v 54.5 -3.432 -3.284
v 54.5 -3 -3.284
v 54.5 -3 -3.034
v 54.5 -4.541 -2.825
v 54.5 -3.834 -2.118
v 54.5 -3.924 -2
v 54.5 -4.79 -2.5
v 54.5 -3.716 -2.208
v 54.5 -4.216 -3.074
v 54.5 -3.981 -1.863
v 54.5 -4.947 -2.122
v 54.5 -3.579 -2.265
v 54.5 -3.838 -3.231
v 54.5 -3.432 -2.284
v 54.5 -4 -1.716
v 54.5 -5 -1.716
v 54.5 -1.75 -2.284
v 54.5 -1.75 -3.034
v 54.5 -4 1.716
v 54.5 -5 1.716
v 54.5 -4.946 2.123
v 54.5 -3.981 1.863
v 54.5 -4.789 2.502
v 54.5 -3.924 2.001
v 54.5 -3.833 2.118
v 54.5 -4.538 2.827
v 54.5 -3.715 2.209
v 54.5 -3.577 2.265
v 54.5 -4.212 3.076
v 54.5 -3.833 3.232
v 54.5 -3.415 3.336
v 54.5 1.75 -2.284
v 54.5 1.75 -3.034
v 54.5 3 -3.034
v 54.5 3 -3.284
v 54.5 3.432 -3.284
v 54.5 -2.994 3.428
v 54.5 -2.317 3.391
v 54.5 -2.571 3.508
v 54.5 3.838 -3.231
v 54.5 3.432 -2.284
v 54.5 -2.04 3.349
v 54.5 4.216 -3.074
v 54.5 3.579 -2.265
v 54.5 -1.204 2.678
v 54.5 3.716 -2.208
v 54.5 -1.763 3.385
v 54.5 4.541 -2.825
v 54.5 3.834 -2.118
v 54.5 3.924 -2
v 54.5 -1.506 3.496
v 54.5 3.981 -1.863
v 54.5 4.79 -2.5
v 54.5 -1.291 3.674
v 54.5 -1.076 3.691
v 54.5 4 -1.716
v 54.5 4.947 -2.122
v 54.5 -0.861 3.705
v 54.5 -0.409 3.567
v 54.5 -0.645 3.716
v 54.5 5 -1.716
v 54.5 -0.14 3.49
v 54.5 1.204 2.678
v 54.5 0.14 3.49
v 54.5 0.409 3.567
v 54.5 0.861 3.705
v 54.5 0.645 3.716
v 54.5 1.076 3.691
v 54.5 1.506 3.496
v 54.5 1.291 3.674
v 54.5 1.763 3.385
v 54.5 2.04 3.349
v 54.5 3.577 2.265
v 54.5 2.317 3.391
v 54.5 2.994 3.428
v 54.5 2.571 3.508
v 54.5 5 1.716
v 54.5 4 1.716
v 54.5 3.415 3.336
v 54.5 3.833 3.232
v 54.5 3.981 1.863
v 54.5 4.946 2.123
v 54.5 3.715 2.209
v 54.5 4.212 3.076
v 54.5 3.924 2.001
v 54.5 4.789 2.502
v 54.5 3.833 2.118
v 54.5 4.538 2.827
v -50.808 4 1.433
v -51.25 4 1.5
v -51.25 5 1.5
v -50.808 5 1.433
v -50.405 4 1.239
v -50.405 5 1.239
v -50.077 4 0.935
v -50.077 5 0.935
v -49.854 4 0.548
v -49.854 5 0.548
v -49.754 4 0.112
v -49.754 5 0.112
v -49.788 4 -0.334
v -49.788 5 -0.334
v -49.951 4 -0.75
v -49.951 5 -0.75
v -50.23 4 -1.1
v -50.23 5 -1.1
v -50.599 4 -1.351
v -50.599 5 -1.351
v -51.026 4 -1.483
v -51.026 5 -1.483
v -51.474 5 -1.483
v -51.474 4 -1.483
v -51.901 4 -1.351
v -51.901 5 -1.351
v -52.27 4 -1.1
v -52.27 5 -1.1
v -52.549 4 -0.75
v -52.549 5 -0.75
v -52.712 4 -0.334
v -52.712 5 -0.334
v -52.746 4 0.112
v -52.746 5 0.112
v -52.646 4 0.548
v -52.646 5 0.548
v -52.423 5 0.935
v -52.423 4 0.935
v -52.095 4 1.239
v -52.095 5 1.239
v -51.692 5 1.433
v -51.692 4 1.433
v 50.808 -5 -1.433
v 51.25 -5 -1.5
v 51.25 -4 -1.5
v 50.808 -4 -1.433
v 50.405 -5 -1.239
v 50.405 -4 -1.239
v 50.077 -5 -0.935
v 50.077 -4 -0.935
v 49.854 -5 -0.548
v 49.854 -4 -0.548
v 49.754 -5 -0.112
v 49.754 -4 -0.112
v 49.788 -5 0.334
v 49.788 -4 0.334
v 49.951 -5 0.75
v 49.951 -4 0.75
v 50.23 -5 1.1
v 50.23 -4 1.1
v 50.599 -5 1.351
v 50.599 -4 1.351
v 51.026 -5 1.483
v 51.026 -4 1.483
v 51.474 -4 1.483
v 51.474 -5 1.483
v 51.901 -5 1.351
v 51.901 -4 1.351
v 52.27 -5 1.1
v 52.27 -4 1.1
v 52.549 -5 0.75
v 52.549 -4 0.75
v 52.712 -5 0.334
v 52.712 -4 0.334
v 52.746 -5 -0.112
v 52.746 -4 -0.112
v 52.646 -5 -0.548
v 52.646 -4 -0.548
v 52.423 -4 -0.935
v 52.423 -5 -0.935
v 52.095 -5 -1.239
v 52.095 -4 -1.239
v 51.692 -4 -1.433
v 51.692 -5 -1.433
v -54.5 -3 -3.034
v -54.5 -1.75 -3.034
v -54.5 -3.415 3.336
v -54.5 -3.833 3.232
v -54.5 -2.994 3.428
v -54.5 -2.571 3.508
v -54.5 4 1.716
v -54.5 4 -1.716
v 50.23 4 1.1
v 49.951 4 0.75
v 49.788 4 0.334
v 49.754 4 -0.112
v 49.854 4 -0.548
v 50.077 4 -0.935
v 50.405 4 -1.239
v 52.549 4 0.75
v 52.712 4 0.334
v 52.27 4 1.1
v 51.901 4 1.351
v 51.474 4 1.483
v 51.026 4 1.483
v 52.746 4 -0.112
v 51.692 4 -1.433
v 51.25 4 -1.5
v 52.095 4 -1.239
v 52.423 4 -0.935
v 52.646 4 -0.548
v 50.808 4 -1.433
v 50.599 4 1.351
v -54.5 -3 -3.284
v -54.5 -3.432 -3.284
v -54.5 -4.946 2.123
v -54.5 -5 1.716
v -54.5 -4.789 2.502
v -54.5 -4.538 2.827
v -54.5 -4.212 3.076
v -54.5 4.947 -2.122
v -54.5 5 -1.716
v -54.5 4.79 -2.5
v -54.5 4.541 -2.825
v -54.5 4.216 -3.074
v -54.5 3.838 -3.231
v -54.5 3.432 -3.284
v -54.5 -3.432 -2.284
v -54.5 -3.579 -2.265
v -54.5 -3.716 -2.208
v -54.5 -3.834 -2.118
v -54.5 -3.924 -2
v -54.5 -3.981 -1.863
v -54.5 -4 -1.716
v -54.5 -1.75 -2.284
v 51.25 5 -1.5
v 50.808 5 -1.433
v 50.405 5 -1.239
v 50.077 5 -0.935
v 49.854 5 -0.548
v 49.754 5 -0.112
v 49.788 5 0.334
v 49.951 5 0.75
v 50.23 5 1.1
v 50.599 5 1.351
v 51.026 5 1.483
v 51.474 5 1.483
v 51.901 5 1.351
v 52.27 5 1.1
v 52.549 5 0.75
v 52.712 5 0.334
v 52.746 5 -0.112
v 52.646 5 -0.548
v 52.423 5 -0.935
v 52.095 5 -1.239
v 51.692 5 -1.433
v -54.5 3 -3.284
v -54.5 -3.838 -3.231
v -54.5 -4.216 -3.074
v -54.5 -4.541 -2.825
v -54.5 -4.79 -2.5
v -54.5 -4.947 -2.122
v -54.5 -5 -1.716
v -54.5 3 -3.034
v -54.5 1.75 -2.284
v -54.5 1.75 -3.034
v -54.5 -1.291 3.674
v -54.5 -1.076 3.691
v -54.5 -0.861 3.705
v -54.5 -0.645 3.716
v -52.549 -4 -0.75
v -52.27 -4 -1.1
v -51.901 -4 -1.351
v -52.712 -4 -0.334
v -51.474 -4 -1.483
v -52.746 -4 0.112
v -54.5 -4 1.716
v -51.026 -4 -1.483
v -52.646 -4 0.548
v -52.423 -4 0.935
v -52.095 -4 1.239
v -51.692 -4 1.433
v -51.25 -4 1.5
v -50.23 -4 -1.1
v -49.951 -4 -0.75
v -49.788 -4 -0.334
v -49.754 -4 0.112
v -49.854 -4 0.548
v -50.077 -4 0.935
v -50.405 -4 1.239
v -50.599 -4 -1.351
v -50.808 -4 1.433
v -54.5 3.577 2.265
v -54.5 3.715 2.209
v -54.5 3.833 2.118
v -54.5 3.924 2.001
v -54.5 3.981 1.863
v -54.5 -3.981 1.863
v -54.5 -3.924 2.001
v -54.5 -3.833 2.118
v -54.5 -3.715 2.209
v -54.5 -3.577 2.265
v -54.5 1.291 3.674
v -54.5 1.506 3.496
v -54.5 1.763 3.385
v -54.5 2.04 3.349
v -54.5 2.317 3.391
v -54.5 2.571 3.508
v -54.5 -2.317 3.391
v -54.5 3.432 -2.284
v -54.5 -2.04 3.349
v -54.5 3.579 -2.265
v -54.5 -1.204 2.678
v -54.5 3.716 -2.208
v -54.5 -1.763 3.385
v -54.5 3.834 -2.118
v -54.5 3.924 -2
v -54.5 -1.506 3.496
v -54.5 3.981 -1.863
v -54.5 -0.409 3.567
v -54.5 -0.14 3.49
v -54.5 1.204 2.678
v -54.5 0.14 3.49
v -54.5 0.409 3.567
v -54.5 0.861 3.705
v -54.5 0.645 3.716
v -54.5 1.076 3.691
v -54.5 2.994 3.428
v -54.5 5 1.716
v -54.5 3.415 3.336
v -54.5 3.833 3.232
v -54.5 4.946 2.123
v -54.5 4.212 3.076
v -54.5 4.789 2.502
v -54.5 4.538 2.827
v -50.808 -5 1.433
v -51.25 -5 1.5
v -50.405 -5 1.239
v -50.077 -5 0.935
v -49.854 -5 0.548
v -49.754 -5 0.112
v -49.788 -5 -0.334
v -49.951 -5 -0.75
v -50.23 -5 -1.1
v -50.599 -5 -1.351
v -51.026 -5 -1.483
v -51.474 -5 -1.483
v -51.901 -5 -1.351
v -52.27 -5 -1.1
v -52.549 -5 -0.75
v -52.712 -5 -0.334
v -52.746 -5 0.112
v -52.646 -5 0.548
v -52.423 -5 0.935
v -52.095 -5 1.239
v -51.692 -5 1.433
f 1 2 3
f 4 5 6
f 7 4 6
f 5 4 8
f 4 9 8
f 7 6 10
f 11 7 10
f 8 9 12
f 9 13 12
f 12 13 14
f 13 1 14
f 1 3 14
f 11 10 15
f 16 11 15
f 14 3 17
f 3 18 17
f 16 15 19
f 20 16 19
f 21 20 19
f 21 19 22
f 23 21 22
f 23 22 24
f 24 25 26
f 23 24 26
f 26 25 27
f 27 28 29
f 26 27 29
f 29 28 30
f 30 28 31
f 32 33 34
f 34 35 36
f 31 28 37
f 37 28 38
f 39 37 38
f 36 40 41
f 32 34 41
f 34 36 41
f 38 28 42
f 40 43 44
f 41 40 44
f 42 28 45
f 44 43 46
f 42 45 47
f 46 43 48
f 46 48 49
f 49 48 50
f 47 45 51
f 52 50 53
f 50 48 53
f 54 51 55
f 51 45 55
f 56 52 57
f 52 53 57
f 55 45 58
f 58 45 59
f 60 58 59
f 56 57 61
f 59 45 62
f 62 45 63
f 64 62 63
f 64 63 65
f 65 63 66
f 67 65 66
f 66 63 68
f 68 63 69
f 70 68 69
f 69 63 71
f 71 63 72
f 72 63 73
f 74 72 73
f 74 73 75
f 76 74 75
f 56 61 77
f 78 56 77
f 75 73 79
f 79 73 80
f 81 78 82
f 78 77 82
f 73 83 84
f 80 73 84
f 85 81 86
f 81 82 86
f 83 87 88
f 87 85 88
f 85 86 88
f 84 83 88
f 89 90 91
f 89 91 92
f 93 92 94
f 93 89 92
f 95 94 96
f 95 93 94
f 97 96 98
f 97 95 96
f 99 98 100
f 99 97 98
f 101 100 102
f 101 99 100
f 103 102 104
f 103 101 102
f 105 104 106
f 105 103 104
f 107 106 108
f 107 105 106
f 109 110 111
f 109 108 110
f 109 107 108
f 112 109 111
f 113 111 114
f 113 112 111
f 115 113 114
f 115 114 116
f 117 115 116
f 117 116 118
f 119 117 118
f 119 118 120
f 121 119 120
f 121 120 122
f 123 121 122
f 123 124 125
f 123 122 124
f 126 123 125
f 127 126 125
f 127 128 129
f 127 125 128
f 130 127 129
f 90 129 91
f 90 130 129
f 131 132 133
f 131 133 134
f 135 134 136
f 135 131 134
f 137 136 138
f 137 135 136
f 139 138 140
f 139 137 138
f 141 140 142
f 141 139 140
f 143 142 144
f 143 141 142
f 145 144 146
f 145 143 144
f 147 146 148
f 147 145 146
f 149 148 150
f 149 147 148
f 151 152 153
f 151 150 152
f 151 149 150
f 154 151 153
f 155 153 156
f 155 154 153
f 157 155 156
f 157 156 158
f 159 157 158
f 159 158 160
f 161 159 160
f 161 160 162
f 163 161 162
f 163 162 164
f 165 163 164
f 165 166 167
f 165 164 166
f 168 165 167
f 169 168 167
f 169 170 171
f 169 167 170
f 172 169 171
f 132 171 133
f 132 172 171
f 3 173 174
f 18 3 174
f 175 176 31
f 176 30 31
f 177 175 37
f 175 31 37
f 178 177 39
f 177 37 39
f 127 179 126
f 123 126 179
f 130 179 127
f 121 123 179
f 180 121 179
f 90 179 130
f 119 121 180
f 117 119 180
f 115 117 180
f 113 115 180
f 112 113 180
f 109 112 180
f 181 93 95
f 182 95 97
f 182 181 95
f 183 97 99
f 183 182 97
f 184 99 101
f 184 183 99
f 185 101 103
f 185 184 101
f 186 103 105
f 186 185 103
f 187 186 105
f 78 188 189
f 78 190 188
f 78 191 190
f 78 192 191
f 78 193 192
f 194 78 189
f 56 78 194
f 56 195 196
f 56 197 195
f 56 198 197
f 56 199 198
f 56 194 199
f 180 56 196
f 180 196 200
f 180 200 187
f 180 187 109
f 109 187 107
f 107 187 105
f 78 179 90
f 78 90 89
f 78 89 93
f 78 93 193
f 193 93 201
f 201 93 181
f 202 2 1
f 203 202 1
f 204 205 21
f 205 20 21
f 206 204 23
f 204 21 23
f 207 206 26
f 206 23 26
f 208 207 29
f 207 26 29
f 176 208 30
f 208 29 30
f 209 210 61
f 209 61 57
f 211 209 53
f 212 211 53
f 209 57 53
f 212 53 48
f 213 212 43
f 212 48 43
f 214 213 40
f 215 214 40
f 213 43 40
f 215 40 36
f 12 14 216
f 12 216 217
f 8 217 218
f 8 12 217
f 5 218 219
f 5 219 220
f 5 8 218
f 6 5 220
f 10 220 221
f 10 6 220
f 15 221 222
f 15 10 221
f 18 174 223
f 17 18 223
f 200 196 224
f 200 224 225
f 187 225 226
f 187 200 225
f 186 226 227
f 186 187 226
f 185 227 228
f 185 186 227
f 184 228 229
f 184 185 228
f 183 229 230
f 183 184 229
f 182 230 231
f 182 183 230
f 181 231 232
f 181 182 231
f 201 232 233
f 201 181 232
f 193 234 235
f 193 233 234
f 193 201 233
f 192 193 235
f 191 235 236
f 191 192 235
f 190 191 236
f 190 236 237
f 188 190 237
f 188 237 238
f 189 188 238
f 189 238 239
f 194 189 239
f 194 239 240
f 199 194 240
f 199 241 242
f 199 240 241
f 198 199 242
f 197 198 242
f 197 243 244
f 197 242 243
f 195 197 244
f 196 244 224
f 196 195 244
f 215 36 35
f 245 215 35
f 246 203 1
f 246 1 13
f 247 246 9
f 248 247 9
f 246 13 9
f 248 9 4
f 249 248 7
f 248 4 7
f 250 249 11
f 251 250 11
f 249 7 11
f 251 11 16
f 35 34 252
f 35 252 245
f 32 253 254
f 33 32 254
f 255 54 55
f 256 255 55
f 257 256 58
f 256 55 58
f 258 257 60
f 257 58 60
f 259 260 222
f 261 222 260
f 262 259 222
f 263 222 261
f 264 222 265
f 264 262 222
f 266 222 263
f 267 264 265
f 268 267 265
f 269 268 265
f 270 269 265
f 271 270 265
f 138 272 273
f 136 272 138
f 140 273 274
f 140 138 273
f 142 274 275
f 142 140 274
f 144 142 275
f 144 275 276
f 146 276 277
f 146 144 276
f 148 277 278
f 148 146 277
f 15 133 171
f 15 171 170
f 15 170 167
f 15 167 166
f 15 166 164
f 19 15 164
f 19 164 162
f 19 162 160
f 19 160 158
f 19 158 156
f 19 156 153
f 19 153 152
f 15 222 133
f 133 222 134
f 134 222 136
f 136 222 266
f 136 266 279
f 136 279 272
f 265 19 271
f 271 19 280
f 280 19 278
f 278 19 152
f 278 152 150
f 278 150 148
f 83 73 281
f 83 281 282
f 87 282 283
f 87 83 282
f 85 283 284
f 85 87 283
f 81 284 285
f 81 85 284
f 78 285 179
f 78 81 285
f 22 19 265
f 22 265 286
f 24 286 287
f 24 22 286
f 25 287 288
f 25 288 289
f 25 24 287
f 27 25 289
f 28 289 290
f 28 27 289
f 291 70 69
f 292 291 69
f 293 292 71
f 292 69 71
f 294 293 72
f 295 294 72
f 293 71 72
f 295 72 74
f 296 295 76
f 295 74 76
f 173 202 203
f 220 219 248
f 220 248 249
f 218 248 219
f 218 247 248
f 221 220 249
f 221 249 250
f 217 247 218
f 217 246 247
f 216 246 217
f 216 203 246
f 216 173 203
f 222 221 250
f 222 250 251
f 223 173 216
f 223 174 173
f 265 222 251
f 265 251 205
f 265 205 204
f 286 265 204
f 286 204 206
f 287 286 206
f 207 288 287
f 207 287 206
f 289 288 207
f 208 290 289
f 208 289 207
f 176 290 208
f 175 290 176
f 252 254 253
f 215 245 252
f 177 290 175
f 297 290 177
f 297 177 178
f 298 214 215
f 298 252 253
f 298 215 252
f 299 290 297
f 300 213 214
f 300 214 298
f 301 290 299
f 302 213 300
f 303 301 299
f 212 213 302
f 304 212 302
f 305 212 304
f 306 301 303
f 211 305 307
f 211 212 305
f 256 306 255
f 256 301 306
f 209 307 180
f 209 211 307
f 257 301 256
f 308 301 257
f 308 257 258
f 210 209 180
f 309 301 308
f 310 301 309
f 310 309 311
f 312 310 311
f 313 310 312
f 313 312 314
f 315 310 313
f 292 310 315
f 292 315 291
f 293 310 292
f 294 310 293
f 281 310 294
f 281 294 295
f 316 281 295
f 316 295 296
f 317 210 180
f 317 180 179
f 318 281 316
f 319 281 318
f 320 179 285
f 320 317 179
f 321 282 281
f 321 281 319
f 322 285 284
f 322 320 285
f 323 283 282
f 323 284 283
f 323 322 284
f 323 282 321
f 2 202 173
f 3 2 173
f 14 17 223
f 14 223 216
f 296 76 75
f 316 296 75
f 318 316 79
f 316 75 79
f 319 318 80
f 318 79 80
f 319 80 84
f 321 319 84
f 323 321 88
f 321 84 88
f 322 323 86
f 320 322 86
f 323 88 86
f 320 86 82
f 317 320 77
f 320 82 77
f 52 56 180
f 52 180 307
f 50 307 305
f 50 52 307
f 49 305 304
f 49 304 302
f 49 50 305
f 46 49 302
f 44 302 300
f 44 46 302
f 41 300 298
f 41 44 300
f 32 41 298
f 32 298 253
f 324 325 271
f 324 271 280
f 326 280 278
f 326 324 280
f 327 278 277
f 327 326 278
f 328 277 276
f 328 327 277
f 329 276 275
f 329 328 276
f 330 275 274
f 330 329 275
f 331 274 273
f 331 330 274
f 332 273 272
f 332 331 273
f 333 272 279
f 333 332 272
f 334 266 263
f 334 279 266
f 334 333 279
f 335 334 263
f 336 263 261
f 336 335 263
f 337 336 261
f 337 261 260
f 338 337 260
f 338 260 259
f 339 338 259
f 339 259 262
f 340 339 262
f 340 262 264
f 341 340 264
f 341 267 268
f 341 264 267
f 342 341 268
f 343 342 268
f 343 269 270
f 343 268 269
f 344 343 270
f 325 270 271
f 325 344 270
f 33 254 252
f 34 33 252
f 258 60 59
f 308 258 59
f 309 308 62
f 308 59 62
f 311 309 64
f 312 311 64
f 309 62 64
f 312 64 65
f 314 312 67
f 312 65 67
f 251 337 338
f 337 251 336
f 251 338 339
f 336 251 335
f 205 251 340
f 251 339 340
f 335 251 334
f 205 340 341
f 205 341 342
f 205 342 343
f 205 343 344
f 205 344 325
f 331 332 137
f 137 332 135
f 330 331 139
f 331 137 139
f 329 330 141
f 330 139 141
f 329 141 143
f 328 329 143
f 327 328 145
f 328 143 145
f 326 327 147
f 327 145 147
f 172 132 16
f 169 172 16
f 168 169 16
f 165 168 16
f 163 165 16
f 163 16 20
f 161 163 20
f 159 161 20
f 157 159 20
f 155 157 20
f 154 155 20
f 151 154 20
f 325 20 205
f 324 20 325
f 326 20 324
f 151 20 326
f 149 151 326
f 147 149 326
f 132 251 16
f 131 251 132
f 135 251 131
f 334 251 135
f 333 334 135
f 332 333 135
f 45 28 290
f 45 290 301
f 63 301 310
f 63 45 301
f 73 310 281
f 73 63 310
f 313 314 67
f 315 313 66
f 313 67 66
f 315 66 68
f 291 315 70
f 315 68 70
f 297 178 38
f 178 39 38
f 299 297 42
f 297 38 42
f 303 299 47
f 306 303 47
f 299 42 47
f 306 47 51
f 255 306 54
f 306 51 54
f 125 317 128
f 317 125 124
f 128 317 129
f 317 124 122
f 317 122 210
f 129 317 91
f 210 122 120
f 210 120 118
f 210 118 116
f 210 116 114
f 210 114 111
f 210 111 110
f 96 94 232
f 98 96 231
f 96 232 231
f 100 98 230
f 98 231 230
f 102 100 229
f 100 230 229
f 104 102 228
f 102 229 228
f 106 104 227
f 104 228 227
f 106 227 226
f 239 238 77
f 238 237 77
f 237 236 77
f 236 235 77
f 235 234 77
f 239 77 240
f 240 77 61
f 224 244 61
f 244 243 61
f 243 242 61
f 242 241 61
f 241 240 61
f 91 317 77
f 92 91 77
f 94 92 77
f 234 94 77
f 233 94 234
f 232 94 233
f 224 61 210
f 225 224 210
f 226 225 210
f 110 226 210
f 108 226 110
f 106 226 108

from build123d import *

# Parameters (mm, degrees)
EXTRUDE1_DEPTH          = 54.5
CUT_EXTRUDE1_DEPTH      = 55.854885702
CUT_EXTRUDE1_DEPTH_BACK = 55.854885702
SKETCH2_R               = 1.5
CUT_EXTRUDE2_DEPTH      = 55.854885702
CUT_EXTRUDE2_DEPTH_BACK = 55.854885702


with BuildPart() as part:
    # Sketch1 → Extrude1 (new, symmetric)
    with BuildSketch(Plane(origin=(0, 0, 0), x_dir=(0, 0, -1), z_dir=(1, 0, 0))):
        with BuildLine():
            Line((-1.715977045, 5), (1.715977045, 5))
            ThreePointArc((1.715977045, 5), (2.824752941, 4.540729986), (3.284022955, 3.43195409))
            Line((3.284022955, 3.43195409), (3.284022955, -3.43195409))
            ThreePointArc((3.284022955, -3.43195409), (2.824752941, -4.540729986), (1.715977045, -5))
            Line((1.715977045, -5), (-1.715977045, -5))
            ThreePointArc((-1.715977045, -5), (-2.672673527, -4.674330771), (-3.23197526, -3.832600305))
            ThreePointArc((-3.23197526, -3.832600305), (-3.383560587, -3.204564402), (-3.507961213, -2.570583572))
            ThreePointArc((-3.507961213, -2.570583572), (-3.356955711, -1.900195953), (-3.674237451, -1.290643232))
            ThreePointArc((-3.674237451, -1.290643232), (-3.698584955, -0.968220458), (-3.715977045, -0.645347786))
            ThreePointArc((-3.715977045, -0.645347786), (-3.479865934, 0), (-3.715977045, 0.645347786))
            ThreePointArc((-3.715977045, 0.645347786), (-3.698584955, 0.968220458), (-3.674237451, 1.290643232))
            ThreePointArc((-3.674237451, 1.290643232), (-3.356955711, 1.900195953), (-3.507961213, 2.570583572))
            ThreePointArc((-3.507961213, 2.570583572), (-3.383560587, 3.204564402), (-3.23197526, 3.832600305))
            ThreePointArc((-3.23197526, 3.832600305), (-2.672673527, 4.674330771), (-1.715977045, 5))
        make_face()
        with BuildLine():
            Line((-1.715977045, 4), (1.715977045, 4))
            ThreePointArc((1.715977045, 4), (2.11764616, 3.833623205), (2.284022955, 3.43195409))
            Line((2.284022955, 3.43195409), (2.284022955, -3.43195409))
            ThreePointArc((2.284022955, -3.43195409), (2.11764616, -3.833623205), (1.715977045, -4))
            Line((1.715977045, -4), (-1.715977045, -4))
            ThreePointArc((-1.715977045, -4), (-2.062553328, -3.882021902), (-2.265167971, -3.577093618))
            ThreePointArc((-2.265167971, -3.577093618), (-2.729865934, 0), (-2.265167971, 3.577093618))
            ThreePointArc((-2.265167971, 3.577093618), (-2.062553328, 3.882021902), (-1.715977045, 4))
        make_face(mode=Mode.SUBTRACT)
    extrude(amount=EXTRUDE1_DEPTH, both=True)

    # Sketch2 → Cut-Extrude1 (cut, two sides: drawn at the far end of the back side and taken through both)
    with BuildSketch(Plane(origin=(0, 0, 0), x_dir=(1, 0, 0), z_dir=(0, 1, 0)).offset(-CUT_EXTRUDE1_DEPTH_BACK)):
        with Locations(Location((-51.25, 0, 0), (0, 0, 270))):
            Circle(SKETCH2_R)
        with Locations(Location((51.25, 0, 0), (0, 0, 90))):
            Circle(SKETCH2_R)
    extrude(amount=CUT_EXTRUDE1_DEPTH + CUT_EXTRUDE1_DEPTH_BACK, mode=Mode.SUBTRACT)

    # Sketch3 → Cut-Extrude2 (cut, two sides: drawn at the far end of the back side and taken through both)
    with BuildSketch(Plane(origin=(0, 0, 0), x_dir=(0, 0, -1), z_dir=(1, 0, 0)).offset(-CUT_EXTRUDE2_DEPTH_BACK)):
        Polygon((0, -1.75), (0, 1.75), (3.034022955, 1.75), (3.034022955, 3), (4.284022955, 3), (4.284022955, -3), (3.034022955, -3), (3.034022955, -1.75), align=None)
    extrude(amount=CUT_EXTRUDE2_DEPTH + CUT_EXTRUDE2_DEPTH_BACK, mode=Mode.SUBTRACT)


solid = part.part
